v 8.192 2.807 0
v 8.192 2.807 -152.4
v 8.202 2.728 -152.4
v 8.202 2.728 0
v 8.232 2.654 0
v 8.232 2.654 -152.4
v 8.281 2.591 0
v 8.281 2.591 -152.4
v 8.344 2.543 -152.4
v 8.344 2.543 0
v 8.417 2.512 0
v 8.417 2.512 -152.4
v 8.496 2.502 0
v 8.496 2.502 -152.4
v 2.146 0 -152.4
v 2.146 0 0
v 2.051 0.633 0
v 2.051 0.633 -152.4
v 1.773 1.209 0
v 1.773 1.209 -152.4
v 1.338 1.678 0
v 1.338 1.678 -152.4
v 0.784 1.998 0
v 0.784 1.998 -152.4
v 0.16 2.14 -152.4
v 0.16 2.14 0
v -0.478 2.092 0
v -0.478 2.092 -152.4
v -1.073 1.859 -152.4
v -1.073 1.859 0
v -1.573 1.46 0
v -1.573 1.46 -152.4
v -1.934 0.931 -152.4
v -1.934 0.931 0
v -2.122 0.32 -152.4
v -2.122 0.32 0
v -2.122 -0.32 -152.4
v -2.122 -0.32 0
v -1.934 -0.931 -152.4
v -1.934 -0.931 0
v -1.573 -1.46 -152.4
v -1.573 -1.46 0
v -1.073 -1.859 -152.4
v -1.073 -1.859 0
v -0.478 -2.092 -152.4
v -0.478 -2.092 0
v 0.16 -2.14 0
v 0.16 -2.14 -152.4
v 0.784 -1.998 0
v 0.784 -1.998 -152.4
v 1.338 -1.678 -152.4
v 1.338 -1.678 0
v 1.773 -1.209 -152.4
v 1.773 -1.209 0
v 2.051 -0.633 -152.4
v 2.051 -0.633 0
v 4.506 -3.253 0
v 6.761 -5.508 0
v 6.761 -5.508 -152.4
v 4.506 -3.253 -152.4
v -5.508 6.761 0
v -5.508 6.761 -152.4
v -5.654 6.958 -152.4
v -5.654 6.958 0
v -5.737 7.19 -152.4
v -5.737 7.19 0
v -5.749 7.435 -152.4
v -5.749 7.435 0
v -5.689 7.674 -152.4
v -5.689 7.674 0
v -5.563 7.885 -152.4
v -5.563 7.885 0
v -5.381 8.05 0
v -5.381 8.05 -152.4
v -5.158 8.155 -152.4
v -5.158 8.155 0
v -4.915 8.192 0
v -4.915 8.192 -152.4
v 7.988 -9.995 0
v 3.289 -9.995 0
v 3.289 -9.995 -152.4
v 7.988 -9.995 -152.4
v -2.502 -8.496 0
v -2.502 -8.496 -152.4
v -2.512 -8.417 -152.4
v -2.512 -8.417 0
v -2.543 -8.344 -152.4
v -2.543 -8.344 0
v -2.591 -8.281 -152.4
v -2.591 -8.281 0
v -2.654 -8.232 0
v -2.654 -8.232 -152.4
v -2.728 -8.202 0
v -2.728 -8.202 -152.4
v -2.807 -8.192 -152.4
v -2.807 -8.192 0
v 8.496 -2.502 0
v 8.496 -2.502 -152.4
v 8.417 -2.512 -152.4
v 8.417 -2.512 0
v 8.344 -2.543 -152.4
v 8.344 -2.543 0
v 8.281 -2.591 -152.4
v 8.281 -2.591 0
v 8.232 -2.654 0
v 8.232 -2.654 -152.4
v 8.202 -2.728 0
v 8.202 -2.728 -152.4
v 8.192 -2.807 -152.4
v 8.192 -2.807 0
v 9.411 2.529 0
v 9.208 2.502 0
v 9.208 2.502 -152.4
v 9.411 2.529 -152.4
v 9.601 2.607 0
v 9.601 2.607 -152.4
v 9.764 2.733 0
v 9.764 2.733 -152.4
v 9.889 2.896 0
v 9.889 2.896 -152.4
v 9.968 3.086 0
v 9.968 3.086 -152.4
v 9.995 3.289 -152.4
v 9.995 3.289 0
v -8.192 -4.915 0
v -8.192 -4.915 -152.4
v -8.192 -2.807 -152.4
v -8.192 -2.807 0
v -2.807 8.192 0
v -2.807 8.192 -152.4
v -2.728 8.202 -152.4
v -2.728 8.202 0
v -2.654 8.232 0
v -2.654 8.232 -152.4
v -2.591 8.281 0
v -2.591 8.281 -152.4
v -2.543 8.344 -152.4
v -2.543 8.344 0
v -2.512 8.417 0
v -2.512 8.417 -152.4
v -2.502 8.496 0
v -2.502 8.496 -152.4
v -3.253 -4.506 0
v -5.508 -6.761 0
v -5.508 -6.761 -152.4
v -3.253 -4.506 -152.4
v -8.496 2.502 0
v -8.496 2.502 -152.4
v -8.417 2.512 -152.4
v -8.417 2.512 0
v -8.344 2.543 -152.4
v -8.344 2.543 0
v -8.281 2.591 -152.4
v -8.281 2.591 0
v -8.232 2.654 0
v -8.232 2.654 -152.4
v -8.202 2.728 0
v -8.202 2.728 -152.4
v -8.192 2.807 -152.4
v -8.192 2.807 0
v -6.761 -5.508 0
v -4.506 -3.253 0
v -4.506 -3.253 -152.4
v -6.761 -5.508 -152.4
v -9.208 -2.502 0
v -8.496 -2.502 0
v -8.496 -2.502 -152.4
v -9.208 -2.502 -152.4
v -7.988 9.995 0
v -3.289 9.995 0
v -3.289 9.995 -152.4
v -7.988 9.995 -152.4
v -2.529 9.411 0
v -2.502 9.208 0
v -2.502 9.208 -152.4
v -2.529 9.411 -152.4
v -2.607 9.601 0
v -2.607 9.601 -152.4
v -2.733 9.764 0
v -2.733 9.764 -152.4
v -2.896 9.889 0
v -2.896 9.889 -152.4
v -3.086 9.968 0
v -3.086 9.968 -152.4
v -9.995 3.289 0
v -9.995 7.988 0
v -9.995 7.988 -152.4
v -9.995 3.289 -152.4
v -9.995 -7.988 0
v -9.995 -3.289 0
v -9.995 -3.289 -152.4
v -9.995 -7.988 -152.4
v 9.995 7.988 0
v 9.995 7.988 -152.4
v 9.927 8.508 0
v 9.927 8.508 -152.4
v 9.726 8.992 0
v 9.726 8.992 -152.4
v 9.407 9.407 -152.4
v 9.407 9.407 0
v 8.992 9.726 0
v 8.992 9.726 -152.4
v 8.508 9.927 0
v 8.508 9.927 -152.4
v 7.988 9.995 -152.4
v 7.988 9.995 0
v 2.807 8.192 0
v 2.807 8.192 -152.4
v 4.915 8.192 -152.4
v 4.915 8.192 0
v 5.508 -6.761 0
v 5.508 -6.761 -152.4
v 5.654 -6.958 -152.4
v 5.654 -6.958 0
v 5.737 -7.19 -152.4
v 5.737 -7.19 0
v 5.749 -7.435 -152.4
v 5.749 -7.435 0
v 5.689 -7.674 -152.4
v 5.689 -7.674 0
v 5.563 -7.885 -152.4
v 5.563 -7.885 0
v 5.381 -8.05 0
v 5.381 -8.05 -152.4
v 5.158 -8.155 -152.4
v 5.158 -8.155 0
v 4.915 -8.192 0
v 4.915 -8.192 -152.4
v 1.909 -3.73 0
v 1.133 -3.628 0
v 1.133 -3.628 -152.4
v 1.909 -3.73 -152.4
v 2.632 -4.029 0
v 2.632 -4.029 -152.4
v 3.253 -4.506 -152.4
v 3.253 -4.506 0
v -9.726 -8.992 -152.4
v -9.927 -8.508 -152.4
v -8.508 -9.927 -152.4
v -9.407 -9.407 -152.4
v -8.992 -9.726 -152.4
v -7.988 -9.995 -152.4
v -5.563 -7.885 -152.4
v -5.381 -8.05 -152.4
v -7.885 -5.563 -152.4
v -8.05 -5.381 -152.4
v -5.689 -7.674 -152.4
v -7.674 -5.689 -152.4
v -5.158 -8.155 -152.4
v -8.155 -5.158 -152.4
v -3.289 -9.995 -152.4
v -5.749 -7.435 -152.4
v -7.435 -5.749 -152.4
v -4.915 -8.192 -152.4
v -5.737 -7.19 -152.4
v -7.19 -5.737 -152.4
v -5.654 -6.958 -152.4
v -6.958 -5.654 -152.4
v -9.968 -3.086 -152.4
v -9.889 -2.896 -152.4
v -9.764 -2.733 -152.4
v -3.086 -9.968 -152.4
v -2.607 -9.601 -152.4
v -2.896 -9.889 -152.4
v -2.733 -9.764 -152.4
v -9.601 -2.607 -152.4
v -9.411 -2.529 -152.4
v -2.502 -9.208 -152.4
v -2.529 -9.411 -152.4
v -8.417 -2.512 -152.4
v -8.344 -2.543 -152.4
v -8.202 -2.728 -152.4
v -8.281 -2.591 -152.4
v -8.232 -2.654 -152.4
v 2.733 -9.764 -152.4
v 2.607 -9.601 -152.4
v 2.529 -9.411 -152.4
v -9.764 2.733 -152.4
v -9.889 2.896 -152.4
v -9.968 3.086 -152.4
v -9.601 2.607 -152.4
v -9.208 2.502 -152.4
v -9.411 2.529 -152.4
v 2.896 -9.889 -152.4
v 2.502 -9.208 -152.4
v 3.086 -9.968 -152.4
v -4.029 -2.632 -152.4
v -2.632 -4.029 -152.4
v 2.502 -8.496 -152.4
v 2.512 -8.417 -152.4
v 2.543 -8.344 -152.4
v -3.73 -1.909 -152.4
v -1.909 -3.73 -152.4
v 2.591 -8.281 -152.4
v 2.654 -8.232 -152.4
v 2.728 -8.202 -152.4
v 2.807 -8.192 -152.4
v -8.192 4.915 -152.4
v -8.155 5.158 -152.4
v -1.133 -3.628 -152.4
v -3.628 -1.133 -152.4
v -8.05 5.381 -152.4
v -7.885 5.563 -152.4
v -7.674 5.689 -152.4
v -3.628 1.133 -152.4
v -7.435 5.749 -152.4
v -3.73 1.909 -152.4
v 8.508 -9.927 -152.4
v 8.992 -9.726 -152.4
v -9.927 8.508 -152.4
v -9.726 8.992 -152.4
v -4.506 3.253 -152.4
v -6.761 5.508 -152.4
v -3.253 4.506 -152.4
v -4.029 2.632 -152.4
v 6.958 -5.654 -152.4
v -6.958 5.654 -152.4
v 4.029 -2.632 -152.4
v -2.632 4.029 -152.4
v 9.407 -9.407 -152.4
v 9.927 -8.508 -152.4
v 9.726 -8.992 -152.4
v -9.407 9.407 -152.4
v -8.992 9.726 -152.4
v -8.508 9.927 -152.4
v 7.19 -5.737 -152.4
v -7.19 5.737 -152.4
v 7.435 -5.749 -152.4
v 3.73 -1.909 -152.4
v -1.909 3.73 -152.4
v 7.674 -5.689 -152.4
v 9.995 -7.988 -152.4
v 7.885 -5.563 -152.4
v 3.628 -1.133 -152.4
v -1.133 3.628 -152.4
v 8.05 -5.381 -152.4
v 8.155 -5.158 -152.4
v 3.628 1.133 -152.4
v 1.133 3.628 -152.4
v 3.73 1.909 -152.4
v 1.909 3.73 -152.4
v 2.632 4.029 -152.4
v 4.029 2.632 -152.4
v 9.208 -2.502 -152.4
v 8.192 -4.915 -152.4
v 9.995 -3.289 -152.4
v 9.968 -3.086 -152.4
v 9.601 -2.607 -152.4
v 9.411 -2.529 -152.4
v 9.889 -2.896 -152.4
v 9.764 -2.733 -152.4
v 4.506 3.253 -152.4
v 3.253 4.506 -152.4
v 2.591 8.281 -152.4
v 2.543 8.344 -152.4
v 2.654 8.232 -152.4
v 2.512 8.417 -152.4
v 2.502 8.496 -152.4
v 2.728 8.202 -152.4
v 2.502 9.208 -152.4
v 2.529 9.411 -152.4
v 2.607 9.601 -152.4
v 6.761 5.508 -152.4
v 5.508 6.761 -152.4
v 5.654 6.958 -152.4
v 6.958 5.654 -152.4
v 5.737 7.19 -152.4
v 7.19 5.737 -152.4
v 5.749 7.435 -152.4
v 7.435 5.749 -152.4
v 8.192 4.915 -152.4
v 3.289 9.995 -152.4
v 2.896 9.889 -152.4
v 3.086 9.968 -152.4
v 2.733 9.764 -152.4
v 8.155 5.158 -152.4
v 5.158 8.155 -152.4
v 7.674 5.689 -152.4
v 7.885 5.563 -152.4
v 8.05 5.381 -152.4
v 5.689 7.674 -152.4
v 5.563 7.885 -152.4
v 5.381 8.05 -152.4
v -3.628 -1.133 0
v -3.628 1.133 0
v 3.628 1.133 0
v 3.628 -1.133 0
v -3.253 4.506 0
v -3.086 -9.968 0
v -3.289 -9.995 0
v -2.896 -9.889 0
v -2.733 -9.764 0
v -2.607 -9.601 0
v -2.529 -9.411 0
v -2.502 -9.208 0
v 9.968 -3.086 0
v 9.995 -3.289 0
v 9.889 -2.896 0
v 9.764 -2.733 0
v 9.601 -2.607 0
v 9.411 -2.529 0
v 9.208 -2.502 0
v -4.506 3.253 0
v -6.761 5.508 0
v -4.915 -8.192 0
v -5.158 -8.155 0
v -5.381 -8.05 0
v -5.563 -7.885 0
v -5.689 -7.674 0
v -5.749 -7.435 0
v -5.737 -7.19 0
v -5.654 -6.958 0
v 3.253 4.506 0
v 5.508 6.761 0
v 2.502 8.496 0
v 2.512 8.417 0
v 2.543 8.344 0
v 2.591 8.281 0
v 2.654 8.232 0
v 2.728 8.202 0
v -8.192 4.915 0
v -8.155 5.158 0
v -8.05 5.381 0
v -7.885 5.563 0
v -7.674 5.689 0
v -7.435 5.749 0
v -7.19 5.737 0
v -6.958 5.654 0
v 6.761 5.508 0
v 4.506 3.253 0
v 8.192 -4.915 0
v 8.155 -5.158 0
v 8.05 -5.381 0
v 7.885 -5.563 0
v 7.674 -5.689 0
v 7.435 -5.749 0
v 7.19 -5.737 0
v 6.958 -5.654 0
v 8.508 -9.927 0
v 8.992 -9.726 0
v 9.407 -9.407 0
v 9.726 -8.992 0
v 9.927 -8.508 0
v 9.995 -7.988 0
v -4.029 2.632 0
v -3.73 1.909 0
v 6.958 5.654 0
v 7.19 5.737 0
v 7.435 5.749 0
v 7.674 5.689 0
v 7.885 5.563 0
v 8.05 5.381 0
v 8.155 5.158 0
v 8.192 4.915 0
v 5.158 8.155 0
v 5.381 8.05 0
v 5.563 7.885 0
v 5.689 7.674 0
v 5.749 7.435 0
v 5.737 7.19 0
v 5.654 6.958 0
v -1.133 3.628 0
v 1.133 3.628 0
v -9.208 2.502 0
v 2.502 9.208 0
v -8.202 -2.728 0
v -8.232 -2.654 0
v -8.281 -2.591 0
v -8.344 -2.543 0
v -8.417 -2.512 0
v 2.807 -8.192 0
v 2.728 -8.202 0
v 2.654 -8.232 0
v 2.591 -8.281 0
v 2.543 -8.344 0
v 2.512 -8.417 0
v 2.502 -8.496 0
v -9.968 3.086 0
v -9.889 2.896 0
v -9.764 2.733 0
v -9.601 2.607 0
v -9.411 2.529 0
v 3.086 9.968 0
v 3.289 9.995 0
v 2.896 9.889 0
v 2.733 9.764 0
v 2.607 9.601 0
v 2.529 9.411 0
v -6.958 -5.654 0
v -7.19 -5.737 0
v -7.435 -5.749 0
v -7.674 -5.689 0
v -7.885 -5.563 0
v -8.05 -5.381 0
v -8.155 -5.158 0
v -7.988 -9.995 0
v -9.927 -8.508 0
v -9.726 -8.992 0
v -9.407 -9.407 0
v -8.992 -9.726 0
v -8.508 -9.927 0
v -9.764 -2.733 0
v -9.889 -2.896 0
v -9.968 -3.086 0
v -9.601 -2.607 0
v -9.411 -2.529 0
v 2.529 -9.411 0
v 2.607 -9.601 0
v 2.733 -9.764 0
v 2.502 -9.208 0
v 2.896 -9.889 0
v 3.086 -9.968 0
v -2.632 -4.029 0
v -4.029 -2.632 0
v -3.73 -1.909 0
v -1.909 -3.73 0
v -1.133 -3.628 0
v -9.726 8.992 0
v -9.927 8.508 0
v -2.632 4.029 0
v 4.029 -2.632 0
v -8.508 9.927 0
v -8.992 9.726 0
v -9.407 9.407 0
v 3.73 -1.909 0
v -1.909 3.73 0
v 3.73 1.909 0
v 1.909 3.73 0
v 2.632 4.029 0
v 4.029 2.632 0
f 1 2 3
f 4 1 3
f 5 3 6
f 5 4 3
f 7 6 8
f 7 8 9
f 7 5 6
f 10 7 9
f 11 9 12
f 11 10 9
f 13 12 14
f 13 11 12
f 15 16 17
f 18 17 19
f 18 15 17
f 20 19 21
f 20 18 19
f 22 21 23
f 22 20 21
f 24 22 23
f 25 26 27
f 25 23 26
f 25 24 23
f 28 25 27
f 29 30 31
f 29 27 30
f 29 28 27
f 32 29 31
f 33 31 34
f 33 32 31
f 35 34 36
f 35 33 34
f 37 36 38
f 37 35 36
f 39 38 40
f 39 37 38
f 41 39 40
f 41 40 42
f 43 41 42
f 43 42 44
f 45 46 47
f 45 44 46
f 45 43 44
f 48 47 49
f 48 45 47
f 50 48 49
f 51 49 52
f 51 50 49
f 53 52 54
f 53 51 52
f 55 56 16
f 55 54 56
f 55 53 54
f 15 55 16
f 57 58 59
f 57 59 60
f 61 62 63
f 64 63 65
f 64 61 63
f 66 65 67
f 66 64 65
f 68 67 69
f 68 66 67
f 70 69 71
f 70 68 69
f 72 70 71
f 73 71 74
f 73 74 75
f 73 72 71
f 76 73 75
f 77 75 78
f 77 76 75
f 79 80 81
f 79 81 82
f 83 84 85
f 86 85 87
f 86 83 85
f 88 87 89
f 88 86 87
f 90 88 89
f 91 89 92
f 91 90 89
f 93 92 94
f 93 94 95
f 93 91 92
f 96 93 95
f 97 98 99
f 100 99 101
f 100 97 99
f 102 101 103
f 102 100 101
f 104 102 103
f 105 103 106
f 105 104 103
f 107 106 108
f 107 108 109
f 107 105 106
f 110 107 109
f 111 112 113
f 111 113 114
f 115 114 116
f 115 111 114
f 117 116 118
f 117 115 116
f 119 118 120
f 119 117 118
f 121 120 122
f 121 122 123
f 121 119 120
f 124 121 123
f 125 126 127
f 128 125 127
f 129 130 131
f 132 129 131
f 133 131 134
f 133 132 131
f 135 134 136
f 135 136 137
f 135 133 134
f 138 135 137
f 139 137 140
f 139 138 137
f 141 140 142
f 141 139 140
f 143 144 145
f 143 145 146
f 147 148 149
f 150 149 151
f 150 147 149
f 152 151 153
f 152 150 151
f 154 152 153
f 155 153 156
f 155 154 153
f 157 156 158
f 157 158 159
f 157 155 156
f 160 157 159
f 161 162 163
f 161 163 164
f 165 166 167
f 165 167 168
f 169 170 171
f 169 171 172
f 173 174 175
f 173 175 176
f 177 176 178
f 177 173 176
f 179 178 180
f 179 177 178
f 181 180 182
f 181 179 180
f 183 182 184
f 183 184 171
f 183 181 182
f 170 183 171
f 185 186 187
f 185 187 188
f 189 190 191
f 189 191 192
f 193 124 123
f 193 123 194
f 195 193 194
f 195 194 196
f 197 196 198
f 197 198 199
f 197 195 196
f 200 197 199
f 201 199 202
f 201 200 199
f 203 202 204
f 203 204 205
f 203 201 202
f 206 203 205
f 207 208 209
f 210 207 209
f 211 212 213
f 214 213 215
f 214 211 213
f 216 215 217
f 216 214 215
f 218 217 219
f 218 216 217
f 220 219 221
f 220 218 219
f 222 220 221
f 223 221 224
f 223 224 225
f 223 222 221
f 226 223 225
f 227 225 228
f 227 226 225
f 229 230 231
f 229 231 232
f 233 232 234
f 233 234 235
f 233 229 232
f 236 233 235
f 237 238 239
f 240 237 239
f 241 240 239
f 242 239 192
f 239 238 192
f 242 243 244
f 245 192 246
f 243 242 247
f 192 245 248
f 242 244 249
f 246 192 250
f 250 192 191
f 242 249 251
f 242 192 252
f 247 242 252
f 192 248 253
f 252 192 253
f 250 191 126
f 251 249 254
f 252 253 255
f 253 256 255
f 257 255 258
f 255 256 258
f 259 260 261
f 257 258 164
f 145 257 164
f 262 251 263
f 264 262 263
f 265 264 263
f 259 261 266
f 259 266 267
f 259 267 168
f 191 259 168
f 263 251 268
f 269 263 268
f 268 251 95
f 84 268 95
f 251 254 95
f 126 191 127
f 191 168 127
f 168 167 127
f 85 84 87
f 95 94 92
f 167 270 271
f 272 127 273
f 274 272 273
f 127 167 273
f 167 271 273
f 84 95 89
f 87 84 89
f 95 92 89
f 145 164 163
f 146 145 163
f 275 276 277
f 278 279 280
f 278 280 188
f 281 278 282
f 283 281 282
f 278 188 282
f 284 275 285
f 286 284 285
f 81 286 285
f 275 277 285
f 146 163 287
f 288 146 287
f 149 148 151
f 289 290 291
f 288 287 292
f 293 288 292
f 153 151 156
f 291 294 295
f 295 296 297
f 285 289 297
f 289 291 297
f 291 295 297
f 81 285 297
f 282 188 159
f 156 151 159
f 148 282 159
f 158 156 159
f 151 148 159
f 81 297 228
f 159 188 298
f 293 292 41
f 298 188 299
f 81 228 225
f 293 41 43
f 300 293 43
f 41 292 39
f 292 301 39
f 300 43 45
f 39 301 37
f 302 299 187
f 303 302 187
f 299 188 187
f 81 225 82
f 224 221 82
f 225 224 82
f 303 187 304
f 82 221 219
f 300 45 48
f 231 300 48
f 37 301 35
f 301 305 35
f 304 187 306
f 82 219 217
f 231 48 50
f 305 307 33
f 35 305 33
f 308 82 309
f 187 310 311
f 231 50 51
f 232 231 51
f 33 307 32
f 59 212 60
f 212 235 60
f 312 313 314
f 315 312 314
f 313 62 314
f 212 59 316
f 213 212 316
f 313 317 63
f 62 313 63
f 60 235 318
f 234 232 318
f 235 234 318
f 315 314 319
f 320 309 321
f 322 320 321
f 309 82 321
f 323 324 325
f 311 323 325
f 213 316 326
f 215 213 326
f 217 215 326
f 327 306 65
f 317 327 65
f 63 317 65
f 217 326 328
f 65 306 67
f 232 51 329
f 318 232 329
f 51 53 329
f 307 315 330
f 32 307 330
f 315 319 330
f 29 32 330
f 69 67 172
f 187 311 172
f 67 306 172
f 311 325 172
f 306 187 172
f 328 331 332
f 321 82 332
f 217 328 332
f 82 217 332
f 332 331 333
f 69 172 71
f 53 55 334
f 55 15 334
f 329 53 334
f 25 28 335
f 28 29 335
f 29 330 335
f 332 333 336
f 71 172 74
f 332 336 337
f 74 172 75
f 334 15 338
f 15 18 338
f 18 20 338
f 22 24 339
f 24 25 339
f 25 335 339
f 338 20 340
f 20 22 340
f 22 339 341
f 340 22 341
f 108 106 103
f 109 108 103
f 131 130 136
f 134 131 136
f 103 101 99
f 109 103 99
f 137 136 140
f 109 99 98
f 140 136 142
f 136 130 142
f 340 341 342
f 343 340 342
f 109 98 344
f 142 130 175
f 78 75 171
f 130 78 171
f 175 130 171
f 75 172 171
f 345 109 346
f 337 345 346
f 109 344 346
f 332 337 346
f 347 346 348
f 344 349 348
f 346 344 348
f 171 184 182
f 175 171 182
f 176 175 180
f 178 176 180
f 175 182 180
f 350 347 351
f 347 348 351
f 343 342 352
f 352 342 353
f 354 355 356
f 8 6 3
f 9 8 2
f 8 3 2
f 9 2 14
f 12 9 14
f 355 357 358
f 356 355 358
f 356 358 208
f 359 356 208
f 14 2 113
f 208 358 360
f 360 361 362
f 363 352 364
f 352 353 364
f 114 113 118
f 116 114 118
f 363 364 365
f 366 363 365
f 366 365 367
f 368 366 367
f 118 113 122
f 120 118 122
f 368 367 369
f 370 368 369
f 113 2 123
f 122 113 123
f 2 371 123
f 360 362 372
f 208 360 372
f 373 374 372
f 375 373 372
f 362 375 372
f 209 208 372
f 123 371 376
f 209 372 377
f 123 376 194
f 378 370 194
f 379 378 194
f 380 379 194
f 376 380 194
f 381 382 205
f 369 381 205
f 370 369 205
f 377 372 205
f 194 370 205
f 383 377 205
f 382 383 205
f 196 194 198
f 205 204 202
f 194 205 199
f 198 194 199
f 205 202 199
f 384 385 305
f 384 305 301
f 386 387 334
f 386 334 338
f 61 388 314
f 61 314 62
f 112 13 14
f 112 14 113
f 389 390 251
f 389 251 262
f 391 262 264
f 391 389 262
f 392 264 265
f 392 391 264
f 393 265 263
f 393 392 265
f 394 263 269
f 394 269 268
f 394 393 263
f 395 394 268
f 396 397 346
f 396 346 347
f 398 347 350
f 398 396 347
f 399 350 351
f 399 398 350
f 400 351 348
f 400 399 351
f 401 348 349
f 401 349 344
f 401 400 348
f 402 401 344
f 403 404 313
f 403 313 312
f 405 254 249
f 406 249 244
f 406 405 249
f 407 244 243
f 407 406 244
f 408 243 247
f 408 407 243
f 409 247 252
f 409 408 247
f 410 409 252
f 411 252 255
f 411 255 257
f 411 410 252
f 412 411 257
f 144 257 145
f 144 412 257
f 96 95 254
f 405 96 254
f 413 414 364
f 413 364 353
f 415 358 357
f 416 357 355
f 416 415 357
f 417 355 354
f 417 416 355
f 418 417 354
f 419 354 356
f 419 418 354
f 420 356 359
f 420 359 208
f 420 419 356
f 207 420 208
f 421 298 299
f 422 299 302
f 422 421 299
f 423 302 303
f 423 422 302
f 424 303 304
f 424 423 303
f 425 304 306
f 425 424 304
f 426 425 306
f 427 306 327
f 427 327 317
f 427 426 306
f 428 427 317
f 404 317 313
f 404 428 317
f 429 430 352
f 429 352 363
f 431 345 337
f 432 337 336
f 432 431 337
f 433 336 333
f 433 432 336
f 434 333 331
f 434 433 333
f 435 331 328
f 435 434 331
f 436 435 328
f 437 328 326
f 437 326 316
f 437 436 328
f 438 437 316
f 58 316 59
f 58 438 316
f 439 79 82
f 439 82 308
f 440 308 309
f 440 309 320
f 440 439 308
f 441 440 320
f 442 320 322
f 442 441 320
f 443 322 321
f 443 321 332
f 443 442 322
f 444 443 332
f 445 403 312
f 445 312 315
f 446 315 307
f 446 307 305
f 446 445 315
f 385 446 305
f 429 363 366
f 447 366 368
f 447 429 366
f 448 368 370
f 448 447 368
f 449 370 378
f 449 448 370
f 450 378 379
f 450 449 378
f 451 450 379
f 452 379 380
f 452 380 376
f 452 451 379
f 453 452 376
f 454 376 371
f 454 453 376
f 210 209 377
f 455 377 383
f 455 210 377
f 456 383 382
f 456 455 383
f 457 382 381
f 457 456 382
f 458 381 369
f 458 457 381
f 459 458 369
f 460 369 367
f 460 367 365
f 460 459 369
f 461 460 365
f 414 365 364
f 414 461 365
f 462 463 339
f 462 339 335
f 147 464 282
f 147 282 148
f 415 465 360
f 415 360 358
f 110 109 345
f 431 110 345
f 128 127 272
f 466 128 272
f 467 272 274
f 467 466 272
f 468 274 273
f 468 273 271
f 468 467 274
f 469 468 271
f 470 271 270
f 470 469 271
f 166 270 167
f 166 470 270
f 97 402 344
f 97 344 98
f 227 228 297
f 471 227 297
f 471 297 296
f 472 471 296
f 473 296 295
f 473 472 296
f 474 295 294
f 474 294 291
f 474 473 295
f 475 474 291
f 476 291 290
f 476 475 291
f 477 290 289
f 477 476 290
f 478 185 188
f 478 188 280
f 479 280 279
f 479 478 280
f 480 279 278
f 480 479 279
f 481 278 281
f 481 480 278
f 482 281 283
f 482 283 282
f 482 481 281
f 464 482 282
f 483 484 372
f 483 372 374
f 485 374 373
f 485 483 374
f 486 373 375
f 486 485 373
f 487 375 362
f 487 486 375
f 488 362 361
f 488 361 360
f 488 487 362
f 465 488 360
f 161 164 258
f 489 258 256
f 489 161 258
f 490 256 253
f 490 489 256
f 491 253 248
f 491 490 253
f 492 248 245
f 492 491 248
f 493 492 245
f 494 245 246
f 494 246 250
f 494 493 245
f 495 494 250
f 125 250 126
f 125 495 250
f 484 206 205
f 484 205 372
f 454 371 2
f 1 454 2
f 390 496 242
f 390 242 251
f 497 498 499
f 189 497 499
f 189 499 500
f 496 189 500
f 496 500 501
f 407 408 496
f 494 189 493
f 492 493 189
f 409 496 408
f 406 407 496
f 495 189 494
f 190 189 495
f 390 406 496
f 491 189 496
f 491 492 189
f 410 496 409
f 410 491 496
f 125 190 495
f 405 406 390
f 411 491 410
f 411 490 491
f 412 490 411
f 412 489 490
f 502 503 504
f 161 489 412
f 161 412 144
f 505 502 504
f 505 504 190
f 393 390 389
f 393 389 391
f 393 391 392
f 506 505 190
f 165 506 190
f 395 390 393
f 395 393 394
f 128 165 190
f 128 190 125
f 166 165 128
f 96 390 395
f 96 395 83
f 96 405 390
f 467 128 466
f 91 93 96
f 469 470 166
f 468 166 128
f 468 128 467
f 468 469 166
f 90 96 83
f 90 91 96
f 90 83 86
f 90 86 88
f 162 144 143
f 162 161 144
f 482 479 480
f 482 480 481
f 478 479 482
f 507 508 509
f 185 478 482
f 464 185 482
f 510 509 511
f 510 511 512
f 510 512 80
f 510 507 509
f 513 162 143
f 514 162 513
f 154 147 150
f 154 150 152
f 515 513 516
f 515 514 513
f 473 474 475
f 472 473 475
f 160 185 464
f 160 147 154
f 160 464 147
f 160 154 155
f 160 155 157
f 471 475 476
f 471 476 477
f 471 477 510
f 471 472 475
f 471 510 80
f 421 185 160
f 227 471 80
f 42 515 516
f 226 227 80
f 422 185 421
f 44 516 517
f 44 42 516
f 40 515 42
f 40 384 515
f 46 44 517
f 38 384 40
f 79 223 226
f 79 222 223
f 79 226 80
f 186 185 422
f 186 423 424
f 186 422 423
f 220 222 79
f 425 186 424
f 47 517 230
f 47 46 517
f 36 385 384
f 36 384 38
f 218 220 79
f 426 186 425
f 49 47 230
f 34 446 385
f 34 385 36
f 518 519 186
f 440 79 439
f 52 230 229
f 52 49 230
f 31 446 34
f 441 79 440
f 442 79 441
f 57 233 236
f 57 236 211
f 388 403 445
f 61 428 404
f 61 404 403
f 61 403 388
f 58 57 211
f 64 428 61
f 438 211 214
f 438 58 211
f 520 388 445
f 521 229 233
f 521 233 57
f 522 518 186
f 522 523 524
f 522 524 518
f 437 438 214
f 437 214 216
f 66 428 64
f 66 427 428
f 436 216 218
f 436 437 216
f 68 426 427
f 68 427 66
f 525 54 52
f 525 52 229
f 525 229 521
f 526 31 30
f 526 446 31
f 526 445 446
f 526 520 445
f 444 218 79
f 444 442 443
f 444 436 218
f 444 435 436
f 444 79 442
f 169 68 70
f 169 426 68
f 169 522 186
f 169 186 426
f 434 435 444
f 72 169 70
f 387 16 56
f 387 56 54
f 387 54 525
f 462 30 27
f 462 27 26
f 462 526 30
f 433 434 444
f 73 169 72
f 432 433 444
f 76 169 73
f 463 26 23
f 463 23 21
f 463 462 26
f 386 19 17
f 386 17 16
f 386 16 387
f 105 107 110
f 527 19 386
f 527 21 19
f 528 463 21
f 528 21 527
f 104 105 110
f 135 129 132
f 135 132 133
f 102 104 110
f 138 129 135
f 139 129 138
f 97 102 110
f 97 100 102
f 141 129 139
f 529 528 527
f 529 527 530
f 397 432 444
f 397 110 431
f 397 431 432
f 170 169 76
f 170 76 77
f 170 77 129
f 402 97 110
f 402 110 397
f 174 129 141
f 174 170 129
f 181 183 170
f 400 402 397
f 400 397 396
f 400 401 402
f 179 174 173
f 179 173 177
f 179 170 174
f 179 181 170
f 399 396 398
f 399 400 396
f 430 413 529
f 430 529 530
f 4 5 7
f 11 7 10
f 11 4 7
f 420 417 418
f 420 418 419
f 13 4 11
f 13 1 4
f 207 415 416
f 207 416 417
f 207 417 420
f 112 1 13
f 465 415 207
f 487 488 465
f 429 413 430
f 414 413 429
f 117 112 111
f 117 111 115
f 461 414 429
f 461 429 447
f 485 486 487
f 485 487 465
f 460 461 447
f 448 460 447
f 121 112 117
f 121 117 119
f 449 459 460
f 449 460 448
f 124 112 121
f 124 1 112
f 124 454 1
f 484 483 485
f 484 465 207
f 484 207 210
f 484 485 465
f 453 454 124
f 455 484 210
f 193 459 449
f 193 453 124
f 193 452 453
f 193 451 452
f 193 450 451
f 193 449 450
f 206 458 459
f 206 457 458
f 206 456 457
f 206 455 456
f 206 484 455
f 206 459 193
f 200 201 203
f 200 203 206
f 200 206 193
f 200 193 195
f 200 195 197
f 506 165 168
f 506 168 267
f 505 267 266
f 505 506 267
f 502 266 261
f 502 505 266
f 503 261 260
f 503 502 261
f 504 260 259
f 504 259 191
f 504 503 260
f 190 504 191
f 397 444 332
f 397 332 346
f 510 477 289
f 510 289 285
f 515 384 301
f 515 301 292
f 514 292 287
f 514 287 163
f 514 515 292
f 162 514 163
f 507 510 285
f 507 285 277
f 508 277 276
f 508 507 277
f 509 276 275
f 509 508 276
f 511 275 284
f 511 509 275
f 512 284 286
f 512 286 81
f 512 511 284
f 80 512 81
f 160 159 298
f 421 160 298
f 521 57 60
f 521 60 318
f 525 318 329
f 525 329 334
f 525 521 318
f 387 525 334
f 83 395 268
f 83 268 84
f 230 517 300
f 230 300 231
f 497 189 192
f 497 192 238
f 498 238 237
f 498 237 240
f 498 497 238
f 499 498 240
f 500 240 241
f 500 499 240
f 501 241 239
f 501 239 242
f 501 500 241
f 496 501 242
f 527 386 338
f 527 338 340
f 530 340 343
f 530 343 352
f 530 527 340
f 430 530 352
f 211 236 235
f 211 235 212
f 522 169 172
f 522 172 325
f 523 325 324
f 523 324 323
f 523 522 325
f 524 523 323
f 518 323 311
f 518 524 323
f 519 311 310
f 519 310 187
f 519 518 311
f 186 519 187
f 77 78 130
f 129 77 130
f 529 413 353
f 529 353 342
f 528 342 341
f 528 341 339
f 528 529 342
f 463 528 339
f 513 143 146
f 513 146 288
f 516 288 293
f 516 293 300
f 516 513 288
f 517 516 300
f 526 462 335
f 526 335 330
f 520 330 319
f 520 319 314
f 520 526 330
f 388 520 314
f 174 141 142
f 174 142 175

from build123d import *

# Parameters (mm, degrees)
SKETCH1_R           = 2.1463
BOSS_EXTRUDE1_DEPTH = 152.4
SKETCH2_W           = 30.13801893
SKETCH2_H           = 25.969901185
CUT_EXTRUDE1_DEPTH  = 152.4


with BuildPart() as part:
    # Sketch1 → Boss-Extrude1 (new body, symmetric)
    with BuildSketch(Plane.XY):
        with BuildLine():
            Line((-9.9949, 7.9883), (-9.9949, 3.2893))
            ThreePointArc((-9.9949, 3.2893), (-9.76427588, 2.73252412), (-9.2075, 2.5019))
            Line((-9.2075, 2.5019), (-8.4963, 2.5019))
            ThreePointArc((-8.4963, 2.5019), (-8.280773853, 2.591173853), (-8.1915, 2.8067))
            Line((-8.1915, 2.8067), (-8.1915, 4.9149))
            ThreePointArc((-8.1915, 4.9149), (-7.674065253, 5.689295824), (-6.760603096, 5.507596904))
            Line((-6.760603096, 5.507596904), (-4.505765747, 3.252759555))
            ThreePointArc((-4.505765747, 3.252759555), (-3.856054457, 2.280397894), (-3.627906192, 1.133419111))
            Line((-3.627906192, 1.133419111), (-3.627906192, -1.133419111))
            ThreePointArc((-3.627906192, -1.133419111), (-3.856054457, -2.280397894), (-4.505765747, -3.252759555))
            Line((-4.505765747, -3.252759555), (-6.760603096, -5.507596904))
            ThreePointArc((-6.760603096, -5.507596904), (-7.674065253, -5.689295824), (-8.1915, -4.9149))
            Line((-8.1915, -4.9149), (-8.1915, -2.8067))
            ThreePointArc((-8.1915, -2.8067), (-8.280773853, -2.591173853), (-8.4963, -2.5019))
            Line((-8.4963, -2.5019), (-9.2075, -2.5019))
            ThreePointArc((-9.2075, -2.5019), (-9.76427588, -2.73252412), (-9.9949, -3.2893))
            Line((-9.9949, -3.2893), (-9.9949, -7.9883))
            ThreePointArc((-9.9949, -7.9883), (-9.407180467, -9.407180467), (-7.9883, -9.9949))
            Line((-7.9883, -9.9949), (-3.2893, -9.9949))
            ThreePointArc((-3.2893, -9.9949), (-2.73252412, -9.76427588), (-2.5019, -9.2075))
            Line((-2.5019, -9.2075), (-2.5019, -8.4963))
            ThreePointArc((-2.5019, -8.4963), (-2.591173853, -8.280773853), (-2.8067, -8.1915))
            Line((-2.8067, -8.1915), (-4.9149, -8.1915))
            ThreePointArc((-4.9149, -8.1915), (-5.689295824, -7.674065253), (-5.507596904, -6.760603096))
            Line((-5.507596904, -6.760603096), (-3.252759555, -4.505765747))
            ThreePointArc((-3.252759555, -4.505765747), (-2.280397894, -3.856054457), (-1.133419111, -3.627906192))
            Line((-1.133419111, -3.627906192), (1.133419111, -3.627906192))
            ThreePointArc((1.133419111, -3.627906192), (2.280397894, -3.856054457), (3.252759555, -4.505765747))
            Line((3.252759555, -4.505765747), (5.507596904, -6.760603096))
            ThreePointArc((5.507596904, -6.760603096), (5.689295824, -7.674065253), (4.9149, -8.1915))
            Line((4.9149, -8.1915), (2.8067, -8.1915))
            ThreePointArc((2.8067, -8.1915), (2.591173853, -8.280773853), (2.5019, -8.4963))
            Line((2.5019, -8.4963), (2.5019, -9.2075))
            ThreePointArc((2.5019, -9.2075), (2.73252412, -9.76427588), (3.2893, -9.9949))
            Line((3.2893, -9.9949), (7.9883, -9.9949))
            ThreePointArc((7.9883, -9.9949), (9.407180467, -9.407180467), (9.9949, -7.9883))
            Line((9.9949, -7.9883), (9.9949, -3.2893))
            ThreePointArc((9.9949, -3.2893), (9.76427588, -2.73252412), (9.2075, -2.5019))
            Line((9.2075, -2.5019), (8.4963, -2.5019))
            ThreePointArc((8.4963, -2.5019), (8.280773853, -2.591173853), (8.1915, -2.8067))
            Line((8.1915, -2.8067), (8.1915, -4.9149))
            ThreePointArc((8.1915, -4.9149), (7.674065253, -5.689295824), (6.760603096, -5.507596904))
            Line((6.760603096, -5.507596904), (4.505765747, -3.252759555))
            ThreePointArc((4.505765747, -3.252759555), (3.856054457, -2.280397894), (3.627906192, -1.133419111))
            Line((3.627906192, -1.133419111), (3.627906192, 1.133419111))
            ThreePointArc((3.627906192, 1.133419111), (3.856054457, 2.280397894), (4.505765747, 3.252759555))
            Line((4.505765747, 3.252759555), (6.760603096, 5.507596904))
            ThreePointArc((6.760603096, 5.507596904), (7.674065253, 5.689295824), (8.1915, 4.9149))
            Line((8.1915, 4.9149), (8.1915, 2.8067))
            ThreePointArc((8.1915, 2.8067), (8.280773853, 2.591173853), (8.4963, 2.5019))
            Line((8.4963, 2.5019), (9.2075, 2.5019))
            ThreePointArc((9.2075, 2.5019), (9.76427588, 2.73252412), (9.9949, 3.2893))
            Line((9.9949, 3.2893), (9.9949, 7.9883))
            ThreePointArc((9.9949, 7.9883), (9.407180467, 9.407180467), (7.9883, 9.9949))
            Line((7.9883, 9.9949), (3.2893, 9.9949))
            ThreePointArc((3.2893, 9.9949), (2.73252412, 9.76427588), (2.5019, 9.2075))
            Line((2.5019, 9.2075), (2.5019, 8.4963))
            ThreePointArc((2.5019, 8.4963), (2.591173853, 8.280773853), (2.8067, 8.1915))
            Line((2.8067, 8.1915), (4.9149, 8.1915))
            ThreePointArc((4.9149, 8.1915), (5.689295824, 7.674065253), (5.507596904, 6.760603096))
            Line((5.507596904, 6.760603096), (3.252759555, 4.505765747))
            ThreePointArc((3.252759555, 4.505765747), (2.280397894, 3.856054457), (1.133419111, 3.627906192))
            Line((1.133419111, 3.627906192), (-1.133419111, 3.627906192))
            ThreePointArc((-1.133419111, 3.627906192), (-2.280397894, 3.856054457), (-3.252759555, 4.505765747))
            Line((-3.252759555, 4.505765747), (-5.507596904, 6.760603096))
            ThreePointArc((-5.507596904, 6.760603096), (-5.689295824, 7.674065253), (-4.9149, 8.1915))
            Line((-4.9149, 8.1915), (-2.8067, 8.1915))
            ThreePointArc((-2.8067, 8.1915), (-2.591173853, 8.280773853), (-2.5019, 8.4963))
            Line((-2.5019, 8.4963), (-2.5019, 9.2075))
            ThreePointArc((-2.5019, 9.2075), (-2.73252412, 9.76427588), (-3.2893, 9.9949))
            Line((-3.2893, 9.9949), (-7.9883, 9.9949))
            ThreePointArc((-7.9883, 9.9949), (-9.407180467, 9.407180467), (-9.9949, 7.9883))
        make_face()
        Circle(SKETCH1_R, mode=Mode.SUBTRACT)
    extrude(amount=BOSS_EXTRUDE1_DEPTH, both=True)

    # Sketch2 → Cut-Extrude1 (cut)
    with BuildSketch(Plane.XY.offset(152.4)):
        with Locations((0.230542333, -0.84546573)):
            Rectangle(SKETCH2_W, SKETCH2_H)
    extrude(amount=-CUT_EXTRUDE1_DEPTH, mode=Mode.SUBTRACT)


solid = part.part
